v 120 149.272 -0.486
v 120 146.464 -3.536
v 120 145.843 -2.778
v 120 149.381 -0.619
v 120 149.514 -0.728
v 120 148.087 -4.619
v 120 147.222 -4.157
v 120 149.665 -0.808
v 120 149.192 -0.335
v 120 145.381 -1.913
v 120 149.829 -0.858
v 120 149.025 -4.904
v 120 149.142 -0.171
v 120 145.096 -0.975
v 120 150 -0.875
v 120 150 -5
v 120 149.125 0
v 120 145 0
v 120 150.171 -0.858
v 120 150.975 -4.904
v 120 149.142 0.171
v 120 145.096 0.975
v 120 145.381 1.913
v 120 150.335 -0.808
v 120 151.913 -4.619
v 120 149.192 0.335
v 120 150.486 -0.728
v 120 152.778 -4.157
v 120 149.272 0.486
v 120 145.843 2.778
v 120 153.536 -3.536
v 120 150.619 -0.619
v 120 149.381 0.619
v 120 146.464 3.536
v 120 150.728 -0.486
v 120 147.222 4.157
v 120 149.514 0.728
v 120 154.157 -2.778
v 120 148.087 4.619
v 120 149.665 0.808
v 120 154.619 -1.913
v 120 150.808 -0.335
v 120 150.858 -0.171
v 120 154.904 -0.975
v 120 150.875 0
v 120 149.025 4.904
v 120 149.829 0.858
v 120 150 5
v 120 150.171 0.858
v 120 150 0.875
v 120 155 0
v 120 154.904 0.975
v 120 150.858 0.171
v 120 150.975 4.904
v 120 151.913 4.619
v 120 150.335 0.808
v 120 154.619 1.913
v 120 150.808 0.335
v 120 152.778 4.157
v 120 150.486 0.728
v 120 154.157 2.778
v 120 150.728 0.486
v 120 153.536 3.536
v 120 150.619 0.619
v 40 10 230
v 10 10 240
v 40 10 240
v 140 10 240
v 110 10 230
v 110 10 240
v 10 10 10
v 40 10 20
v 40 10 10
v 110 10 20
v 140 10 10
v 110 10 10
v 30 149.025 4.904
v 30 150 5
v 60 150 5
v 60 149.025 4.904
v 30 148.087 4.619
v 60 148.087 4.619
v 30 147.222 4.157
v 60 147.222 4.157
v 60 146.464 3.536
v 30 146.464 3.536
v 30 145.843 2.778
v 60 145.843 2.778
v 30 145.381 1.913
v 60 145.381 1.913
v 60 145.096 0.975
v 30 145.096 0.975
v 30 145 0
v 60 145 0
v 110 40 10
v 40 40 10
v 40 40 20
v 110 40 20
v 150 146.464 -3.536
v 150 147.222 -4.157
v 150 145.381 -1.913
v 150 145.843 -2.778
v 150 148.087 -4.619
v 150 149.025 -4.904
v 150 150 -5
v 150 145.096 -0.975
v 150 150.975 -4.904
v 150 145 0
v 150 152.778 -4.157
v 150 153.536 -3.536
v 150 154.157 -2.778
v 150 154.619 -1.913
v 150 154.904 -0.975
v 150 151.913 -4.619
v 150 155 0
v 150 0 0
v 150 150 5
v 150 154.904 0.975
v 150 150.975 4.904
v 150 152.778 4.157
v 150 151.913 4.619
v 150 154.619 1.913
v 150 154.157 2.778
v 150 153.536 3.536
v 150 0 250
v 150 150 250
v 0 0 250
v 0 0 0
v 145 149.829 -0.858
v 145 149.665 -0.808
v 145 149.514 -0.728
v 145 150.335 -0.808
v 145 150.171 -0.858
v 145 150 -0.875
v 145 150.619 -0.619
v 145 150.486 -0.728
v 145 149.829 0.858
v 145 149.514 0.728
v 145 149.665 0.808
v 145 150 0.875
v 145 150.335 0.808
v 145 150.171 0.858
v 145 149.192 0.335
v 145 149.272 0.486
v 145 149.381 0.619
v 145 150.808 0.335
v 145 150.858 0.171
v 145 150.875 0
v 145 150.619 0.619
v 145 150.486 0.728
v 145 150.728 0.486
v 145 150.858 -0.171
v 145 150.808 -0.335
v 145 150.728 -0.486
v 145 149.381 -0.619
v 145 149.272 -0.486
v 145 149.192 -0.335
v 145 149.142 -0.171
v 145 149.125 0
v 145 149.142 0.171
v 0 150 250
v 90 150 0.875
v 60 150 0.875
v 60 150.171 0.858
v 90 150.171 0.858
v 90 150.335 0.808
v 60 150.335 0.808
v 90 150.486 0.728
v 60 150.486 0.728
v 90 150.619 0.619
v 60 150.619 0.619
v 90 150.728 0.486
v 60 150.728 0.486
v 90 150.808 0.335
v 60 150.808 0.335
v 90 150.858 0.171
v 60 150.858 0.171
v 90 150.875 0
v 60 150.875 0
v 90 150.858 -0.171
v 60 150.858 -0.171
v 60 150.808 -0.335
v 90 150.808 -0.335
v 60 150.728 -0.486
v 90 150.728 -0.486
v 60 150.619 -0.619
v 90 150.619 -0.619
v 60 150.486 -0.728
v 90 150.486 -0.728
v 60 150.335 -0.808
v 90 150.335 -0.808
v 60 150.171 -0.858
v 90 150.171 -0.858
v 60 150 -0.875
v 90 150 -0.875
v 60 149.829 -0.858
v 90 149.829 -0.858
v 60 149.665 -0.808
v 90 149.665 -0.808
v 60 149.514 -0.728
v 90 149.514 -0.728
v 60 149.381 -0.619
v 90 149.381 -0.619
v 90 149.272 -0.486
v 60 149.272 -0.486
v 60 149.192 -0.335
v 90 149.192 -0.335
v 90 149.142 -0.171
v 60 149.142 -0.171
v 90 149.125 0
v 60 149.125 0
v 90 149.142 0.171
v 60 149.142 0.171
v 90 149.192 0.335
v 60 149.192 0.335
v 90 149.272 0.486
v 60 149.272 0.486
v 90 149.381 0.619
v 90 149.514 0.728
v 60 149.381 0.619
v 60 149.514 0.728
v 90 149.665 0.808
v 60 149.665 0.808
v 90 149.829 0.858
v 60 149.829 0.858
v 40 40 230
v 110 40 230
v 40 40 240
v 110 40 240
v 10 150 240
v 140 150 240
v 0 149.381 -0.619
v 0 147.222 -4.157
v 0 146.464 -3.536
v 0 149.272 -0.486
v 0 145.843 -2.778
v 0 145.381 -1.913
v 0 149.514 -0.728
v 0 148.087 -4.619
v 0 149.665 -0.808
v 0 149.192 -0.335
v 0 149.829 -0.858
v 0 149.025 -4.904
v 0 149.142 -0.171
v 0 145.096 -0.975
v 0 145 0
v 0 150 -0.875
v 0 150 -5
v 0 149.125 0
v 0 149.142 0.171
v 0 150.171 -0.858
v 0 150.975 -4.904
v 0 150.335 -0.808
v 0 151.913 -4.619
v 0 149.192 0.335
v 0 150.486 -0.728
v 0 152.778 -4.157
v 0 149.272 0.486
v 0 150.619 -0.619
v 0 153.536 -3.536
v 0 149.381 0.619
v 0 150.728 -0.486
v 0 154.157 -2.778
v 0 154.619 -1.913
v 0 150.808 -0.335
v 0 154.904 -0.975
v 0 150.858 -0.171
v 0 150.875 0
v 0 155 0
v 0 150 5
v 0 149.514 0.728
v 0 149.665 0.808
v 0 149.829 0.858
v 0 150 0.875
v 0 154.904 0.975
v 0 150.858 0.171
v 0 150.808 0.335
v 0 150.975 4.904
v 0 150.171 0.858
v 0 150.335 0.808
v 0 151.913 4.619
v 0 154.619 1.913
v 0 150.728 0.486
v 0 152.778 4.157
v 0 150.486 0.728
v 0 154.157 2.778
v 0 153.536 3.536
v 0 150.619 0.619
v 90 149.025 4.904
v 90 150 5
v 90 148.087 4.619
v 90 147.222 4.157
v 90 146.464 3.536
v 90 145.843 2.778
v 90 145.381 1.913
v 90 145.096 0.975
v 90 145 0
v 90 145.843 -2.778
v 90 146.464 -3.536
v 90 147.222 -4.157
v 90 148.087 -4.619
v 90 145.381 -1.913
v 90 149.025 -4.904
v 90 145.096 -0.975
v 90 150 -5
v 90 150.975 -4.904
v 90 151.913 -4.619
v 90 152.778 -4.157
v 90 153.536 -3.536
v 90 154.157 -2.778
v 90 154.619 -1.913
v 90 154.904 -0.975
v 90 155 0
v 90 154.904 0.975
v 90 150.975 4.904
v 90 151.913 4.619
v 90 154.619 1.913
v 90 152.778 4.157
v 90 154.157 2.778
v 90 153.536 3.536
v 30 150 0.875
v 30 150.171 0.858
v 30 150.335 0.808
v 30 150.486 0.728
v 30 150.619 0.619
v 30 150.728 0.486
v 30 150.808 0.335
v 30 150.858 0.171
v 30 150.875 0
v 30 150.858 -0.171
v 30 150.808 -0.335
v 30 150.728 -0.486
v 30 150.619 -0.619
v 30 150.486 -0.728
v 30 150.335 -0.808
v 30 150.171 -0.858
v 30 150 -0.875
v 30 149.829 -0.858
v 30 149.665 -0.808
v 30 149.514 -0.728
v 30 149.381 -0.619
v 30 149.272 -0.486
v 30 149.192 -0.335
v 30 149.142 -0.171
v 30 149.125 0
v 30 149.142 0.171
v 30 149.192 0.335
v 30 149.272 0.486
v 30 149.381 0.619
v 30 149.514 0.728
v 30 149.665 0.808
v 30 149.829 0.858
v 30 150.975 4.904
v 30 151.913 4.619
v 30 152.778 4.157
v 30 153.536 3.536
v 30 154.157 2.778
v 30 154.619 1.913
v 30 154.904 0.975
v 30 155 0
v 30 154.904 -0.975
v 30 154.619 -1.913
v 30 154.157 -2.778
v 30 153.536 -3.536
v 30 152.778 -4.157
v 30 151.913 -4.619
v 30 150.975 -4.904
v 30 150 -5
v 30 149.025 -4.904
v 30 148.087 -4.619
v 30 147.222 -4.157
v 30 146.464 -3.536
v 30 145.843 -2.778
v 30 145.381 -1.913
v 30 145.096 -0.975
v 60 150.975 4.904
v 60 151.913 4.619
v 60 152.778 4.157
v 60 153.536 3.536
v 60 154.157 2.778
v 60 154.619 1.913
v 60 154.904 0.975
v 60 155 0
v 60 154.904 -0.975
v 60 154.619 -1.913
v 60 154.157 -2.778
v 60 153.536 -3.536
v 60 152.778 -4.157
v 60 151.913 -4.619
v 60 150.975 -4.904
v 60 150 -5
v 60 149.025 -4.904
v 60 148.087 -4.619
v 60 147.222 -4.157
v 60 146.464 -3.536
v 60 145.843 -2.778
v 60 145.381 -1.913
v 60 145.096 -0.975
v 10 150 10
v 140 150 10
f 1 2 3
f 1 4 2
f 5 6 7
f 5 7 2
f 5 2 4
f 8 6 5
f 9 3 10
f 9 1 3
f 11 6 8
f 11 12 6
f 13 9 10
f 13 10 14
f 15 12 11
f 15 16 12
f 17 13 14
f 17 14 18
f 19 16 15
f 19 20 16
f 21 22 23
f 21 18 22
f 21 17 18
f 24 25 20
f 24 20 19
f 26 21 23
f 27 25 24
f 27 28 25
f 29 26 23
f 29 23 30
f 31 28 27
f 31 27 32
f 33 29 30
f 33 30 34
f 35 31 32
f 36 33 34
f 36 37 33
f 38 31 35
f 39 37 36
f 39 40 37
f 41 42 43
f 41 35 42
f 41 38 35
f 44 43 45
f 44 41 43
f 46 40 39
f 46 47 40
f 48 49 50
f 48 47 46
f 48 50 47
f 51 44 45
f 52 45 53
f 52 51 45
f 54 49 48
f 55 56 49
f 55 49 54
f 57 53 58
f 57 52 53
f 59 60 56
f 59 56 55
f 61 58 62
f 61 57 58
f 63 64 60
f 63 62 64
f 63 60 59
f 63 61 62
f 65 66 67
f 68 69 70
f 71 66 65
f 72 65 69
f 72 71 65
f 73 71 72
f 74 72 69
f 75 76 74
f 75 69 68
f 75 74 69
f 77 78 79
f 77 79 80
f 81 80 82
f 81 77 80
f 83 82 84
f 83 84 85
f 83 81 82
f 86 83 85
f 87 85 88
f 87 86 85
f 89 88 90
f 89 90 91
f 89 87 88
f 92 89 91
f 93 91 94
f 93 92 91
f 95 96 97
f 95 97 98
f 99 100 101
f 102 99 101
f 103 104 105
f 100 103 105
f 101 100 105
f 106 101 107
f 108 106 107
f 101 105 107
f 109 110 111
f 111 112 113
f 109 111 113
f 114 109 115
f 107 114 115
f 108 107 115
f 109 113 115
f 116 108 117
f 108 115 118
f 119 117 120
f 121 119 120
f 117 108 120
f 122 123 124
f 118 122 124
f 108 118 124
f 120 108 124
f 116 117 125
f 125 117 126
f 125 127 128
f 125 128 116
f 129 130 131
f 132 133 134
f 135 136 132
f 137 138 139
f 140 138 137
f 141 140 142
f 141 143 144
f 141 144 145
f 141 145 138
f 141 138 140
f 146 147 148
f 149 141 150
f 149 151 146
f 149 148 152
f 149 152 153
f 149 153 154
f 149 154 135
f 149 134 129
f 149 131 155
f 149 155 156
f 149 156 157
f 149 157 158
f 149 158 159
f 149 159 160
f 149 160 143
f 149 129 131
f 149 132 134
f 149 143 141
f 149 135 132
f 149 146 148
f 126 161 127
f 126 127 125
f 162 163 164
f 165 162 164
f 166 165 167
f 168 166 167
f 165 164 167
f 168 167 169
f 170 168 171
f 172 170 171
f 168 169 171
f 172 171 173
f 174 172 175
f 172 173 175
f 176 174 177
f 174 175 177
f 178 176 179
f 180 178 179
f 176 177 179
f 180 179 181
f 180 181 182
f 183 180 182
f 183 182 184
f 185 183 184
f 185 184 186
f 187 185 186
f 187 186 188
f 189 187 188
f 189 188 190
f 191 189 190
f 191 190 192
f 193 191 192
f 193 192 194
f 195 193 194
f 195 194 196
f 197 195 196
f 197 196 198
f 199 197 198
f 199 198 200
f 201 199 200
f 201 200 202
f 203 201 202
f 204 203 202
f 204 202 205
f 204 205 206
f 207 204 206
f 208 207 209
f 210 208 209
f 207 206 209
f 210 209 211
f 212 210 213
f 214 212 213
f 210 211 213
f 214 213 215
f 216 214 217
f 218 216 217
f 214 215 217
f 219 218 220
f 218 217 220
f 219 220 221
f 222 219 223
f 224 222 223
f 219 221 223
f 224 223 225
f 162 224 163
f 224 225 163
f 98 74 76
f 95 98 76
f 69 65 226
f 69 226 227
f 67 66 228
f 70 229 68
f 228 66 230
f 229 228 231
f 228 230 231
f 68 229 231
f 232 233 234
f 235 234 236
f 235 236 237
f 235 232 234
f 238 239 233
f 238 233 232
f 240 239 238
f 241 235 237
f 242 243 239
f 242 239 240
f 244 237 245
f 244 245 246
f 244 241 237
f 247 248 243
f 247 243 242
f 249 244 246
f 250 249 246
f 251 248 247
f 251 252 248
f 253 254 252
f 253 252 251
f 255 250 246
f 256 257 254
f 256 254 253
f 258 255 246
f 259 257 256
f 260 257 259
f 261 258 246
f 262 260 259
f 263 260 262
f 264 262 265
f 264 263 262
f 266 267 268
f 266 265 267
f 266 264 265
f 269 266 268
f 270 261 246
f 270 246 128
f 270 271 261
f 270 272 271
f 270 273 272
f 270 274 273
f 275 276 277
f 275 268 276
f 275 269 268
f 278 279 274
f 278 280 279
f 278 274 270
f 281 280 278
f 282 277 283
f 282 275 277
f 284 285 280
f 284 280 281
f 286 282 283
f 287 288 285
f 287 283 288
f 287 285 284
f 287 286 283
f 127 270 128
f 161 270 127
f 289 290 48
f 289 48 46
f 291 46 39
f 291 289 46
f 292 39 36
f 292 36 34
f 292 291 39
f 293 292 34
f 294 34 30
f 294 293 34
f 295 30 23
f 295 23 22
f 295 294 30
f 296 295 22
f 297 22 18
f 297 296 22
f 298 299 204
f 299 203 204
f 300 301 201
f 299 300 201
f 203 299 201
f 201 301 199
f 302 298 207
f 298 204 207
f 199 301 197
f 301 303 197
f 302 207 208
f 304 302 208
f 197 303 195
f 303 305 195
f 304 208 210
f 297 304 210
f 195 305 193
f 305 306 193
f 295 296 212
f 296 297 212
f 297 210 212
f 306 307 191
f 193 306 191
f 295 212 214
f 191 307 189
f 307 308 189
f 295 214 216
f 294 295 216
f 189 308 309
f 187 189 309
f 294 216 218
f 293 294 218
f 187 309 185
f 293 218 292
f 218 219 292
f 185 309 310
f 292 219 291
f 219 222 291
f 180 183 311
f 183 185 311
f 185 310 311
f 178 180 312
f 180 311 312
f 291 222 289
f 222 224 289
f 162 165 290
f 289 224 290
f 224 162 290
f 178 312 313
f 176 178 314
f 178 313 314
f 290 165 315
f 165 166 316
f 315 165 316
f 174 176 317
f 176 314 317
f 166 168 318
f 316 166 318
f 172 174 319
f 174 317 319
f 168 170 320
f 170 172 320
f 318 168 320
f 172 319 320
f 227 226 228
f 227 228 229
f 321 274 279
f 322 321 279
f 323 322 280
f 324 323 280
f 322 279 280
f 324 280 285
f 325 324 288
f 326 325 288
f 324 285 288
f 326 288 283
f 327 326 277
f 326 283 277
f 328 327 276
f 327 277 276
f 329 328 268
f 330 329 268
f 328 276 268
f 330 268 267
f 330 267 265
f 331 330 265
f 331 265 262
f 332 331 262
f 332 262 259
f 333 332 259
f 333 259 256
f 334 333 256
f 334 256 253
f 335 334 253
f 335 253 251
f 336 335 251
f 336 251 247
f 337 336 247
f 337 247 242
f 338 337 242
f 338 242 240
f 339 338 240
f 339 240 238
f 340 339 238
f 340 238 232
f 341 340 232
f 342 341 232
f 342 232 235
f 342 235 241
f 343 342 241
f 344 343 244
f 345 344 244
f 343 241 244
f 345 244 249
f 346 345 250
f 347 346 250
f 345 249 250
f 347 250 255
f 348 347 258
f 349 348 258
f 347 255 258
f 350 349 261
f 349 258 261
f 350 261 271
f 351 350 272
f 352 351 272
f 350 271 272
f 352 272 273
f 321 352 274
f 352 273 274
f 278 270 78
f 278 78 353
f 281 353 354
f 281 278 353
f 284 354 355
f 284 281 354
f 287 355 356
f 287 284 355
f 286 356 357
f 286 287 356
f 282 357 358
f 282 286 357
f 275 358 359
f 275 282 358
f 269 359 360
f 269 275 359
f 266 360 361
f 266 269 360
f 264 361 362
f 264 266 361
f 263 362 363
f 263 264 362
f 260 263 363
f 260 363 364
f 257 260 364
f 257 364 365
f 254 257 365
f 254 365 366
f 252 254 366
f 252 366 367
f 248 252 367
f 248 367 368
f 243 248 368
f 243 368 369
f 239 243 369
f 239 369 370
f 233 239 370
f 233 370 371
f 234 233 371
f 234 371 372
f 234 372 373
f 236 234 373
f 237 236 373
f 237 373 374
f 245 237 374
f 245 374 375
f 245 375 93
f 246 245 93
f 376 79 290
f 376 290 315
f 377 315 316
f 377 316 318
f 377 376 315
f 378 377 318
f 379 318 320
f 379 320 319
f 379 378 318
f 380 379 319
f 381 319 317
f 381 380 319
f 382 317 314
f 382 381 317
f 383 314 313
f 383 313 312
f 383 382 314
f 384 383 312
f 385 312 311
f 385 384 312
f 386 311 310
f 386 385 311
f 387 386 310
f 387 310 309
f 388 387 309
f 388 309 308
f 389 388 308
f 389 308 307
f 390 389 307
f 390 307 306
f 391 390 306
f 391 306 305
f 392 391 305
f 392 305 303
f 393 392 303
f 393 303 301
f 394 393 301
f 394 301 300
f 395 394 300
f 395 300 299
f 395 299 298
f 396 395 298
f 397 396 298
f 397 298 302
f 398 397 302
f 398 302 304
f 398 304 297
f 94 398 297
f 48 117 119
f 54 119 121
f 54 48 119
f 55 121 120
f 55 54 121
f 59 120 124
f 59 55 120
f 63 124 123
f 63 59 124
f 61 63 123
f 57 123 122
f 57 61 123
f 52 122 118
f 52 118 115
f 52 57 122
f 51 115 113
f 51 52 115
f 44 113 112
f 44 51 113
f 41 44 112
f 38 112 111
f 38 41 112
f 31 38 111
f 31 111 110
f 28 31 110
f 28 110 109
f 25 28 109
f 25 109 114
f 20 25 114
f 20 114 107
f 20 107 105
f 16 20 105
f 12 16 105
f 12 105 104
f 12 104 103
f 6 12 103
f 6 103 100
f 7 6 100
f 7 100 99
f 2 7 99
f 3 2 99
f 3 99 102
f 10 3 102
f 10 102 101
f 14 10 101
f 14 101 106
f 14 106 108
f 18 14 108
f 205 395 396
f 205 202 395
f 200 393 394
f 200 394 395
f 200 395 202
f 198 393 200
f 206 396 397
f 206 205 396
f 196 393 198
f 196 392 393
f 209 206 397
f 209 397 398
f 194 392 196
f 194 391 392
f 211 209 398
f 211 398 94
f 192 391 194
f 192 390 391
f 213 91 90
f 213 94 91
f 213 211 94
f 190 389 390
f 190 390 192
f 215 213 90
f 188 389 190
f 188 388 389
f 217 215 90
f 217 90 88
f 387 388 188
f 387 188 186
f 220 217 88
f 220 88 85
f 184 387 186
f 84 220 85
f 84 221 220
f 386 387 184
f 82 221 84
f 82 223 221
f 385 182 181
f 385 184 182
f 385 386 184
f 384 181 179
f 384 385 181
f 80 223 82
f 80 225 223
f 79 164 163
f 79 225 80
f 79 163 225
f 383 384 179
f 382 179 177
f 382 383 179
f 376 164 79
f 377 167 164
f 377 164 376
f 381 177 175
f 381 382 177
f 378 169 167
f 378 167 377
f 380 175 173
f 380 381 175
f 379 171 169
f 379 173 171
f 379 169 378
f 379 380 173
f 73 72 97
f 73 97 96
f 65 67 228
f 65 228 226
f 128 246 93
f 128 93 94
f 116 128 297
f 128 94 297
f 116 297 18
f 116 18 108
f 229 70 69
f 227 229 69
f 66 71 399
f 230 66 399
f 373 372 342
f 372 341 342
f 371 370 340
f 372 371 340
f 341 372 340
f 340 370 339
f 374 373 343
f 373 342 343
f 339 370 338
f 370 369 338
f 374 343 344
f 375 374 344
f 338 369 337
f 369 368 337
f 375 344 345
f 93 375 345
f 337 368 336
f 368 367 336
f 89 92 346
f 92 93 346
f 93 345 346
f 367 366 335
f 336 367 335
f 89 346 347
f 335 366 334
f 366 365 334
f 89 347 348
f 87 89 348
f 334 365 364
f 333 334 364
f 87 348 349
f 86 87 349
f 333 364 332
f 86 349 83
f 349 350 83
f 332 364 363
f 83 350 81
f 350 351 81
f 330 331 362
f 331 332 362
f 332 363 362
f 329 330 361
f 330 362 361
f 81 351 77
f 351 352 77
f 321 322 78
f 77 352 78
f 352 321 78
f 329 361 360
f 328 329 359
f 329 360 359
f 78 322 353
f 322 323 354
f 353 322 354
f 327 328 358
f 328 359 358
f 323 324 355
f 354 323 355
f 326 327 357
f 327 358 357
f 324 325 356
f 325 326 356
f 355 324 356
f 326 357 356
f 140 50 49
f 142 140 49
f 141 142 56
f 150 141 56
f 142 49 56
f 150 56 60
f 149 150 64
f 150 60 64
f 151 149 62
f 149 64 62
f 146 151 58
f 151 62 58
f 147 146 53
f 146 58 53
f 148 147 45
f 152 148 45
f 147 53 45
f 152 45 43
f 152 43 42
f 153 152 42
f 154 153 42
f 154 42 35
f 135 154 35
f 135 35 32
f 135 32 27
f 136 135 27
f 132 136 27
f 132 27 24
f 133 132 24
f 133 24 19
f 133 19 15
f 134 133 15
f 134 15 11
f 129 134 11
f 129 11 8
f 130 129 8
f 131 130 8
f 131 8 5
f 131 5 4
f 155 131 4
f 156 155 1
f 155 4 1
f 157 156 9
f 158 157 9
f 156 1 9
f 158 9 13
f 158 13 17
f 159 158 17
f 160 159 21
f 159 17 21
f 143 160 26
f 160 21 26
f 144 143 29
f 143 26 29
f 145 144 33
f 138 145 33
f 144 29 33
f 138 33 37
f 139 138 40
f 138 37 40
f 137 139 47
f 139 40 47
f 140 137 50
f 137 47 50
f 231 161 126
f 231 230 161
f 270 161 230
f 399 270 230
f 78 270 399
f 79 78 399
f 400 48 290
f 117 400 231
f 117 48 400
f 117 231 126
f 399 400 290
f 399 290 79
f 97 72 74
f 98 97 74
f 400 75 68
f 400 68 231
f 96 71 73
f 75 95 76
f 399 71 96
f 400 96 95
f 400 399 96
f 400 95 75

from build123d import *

# Parameters (mm, degrees)
SKETCH1_W           = 150
SKETCH1_H           = 150
BOSS_EXTRUDE1_DEPTH = 250
SHELL1_T            = -10
SKETCH3_W           = 120
SKETCH3_H           = 220
SKETCH3_W_2         = 110
SKETCH3_H_2         = 210
BOSS_EXTRUDE2_DEPTH = 0.001
SKETCH4_W           = 70
SKETCH4_H           = 10
BOSS_EXTRUDE3_DEPTH = 40
SKETCH5_R           = 5
BOSS_EXTRUDE4_DEPTH = 30
SKETCH6_R           = 5
CUT_EXTRUDE2_DEPTH  = 30
SKETCH7_R           = 5
BOSS_EXTRUDE5_DEPTH = 30
SKETCH8_R           = 5
CUT_EXTRUDE3_DEPTH  = 30
SKETCH9_R           = 5
BOSS_EXTRUDE6_DEPTH = 30
SKETCH10_R          = 0.875
CUT_EXTRUDE4_DEPTH  = 145


with BuildPart() as part:
    # Sketch1 → Boss-Extrude1 (new body)
    with BuildSketch(Plane.XY):
        with Locations((75, 75)):
            Rectangle(SKETCH1_W, SKETCH1_H)
    extrude(amount=BOSS_EXTRUDE1_DEPTH)

    # Shell1
    shell1_openings = [part.faces().sort_by_distance(p)[0] for p in [
        (75, 150, 125),
    ]]
    offset(amount=SHELL1_T, openings=shell1_openings, kind=Kind.INTERSECTION)

    # Sketch3 → Boss-Extrude2 (add)
    with BuildSketch(Plane(origin=(0, 0, 0), x_dir=(1, 0, 0), z_dir=(0, 1, 0))):
        with Locations((75, -125)):
            Rectangle(SKETCH3_W, SKETCH3_H)
        with Locations((75, -125)):
            Rectangle(SKETCH3_W_2, SKETCH3_H_2, mode=Mode.SUBTRACT)
    extrude(amount=BOSS_EXTRUDE2_DEPTH)

    # Sketch4 → Boss-Extrude3 (add)
    with BuildSketch(Plane(origin=(0, 0, 0), x_dir=(1, 0, 0), z_dir=(0, 1, 0))):
        with Locations((75, -235)):
            Rectangle(SKETCH4_W, SKETCH4_H)
        with Locations((75, -15)):
            Rectangle(SKETCH4_W, SKETCH4_H)
    extrude(amount=BOSS_EXTRUDE3_DEPTH)

    # Sketch5 → Boss-Extrude4 (add)
    with BuildSketch(Plane.ZY):
        with Locations((0, 150)):
            Circle(SKETCH5_R)
    extrude(amount=-BOSS_EXTRUDE4_DEPTH)

    # Sketch6 → Cut-Extrude2 (cut)
    with BuildSketch(Plane(origin=(30, 0, 0), x_dir=(0, 0, -1), z_dir=(1, 0, 0))):
        with Locations((0, 150)):
            Circle(SKETCH6_R)
    extrude(amount=CUT_EXTRUDE2_DEPTH, mode=Mode.SUBTRACT)

    # Sketch7 → Boss-Extrude5 (add)
    with BuildSketch(Plane.ZY.offset(-60)):
        with Locations((0, 150)):
            Circle(SKETCH7_R)
    extrude(amount=-BOSS_EXTRUDE5_DEPTH)

    # Sketch8 → Cut-Extrude3 (cut)
    with BuildSketch(Plane(origin=(90, 0, 0), x_dir=(0, 0, -1), z_dir=(1, 0, 0))):
        with Locations((0, 150)):
            Circle(SKETCH8_R)
    extrude(amount=CUT_EXTRUDE3_DEPTH, mode=Mode.SUBTRACT)

    # Sketch9 → Boss-Extrude6 (add)
    with BuildSketch(Plane.ZY.offset(-120)):
        with Locations((0, 150)):
            Circle(SKETCH9_R)
    extrude(amount=-BOSS_EXTRUDE6_DEPTH)

    # Sketch10 → Cut-Extrude4 (cut)
    with BuildSketch(Plane.ZY):
        with Locations((0, 150)):
            Circle(SKETCH10_R)
    extrude(amount=-CUT_EXTRUDE4_DEPTH, mode=Mode.SUBTRACT)


solid = part.part
